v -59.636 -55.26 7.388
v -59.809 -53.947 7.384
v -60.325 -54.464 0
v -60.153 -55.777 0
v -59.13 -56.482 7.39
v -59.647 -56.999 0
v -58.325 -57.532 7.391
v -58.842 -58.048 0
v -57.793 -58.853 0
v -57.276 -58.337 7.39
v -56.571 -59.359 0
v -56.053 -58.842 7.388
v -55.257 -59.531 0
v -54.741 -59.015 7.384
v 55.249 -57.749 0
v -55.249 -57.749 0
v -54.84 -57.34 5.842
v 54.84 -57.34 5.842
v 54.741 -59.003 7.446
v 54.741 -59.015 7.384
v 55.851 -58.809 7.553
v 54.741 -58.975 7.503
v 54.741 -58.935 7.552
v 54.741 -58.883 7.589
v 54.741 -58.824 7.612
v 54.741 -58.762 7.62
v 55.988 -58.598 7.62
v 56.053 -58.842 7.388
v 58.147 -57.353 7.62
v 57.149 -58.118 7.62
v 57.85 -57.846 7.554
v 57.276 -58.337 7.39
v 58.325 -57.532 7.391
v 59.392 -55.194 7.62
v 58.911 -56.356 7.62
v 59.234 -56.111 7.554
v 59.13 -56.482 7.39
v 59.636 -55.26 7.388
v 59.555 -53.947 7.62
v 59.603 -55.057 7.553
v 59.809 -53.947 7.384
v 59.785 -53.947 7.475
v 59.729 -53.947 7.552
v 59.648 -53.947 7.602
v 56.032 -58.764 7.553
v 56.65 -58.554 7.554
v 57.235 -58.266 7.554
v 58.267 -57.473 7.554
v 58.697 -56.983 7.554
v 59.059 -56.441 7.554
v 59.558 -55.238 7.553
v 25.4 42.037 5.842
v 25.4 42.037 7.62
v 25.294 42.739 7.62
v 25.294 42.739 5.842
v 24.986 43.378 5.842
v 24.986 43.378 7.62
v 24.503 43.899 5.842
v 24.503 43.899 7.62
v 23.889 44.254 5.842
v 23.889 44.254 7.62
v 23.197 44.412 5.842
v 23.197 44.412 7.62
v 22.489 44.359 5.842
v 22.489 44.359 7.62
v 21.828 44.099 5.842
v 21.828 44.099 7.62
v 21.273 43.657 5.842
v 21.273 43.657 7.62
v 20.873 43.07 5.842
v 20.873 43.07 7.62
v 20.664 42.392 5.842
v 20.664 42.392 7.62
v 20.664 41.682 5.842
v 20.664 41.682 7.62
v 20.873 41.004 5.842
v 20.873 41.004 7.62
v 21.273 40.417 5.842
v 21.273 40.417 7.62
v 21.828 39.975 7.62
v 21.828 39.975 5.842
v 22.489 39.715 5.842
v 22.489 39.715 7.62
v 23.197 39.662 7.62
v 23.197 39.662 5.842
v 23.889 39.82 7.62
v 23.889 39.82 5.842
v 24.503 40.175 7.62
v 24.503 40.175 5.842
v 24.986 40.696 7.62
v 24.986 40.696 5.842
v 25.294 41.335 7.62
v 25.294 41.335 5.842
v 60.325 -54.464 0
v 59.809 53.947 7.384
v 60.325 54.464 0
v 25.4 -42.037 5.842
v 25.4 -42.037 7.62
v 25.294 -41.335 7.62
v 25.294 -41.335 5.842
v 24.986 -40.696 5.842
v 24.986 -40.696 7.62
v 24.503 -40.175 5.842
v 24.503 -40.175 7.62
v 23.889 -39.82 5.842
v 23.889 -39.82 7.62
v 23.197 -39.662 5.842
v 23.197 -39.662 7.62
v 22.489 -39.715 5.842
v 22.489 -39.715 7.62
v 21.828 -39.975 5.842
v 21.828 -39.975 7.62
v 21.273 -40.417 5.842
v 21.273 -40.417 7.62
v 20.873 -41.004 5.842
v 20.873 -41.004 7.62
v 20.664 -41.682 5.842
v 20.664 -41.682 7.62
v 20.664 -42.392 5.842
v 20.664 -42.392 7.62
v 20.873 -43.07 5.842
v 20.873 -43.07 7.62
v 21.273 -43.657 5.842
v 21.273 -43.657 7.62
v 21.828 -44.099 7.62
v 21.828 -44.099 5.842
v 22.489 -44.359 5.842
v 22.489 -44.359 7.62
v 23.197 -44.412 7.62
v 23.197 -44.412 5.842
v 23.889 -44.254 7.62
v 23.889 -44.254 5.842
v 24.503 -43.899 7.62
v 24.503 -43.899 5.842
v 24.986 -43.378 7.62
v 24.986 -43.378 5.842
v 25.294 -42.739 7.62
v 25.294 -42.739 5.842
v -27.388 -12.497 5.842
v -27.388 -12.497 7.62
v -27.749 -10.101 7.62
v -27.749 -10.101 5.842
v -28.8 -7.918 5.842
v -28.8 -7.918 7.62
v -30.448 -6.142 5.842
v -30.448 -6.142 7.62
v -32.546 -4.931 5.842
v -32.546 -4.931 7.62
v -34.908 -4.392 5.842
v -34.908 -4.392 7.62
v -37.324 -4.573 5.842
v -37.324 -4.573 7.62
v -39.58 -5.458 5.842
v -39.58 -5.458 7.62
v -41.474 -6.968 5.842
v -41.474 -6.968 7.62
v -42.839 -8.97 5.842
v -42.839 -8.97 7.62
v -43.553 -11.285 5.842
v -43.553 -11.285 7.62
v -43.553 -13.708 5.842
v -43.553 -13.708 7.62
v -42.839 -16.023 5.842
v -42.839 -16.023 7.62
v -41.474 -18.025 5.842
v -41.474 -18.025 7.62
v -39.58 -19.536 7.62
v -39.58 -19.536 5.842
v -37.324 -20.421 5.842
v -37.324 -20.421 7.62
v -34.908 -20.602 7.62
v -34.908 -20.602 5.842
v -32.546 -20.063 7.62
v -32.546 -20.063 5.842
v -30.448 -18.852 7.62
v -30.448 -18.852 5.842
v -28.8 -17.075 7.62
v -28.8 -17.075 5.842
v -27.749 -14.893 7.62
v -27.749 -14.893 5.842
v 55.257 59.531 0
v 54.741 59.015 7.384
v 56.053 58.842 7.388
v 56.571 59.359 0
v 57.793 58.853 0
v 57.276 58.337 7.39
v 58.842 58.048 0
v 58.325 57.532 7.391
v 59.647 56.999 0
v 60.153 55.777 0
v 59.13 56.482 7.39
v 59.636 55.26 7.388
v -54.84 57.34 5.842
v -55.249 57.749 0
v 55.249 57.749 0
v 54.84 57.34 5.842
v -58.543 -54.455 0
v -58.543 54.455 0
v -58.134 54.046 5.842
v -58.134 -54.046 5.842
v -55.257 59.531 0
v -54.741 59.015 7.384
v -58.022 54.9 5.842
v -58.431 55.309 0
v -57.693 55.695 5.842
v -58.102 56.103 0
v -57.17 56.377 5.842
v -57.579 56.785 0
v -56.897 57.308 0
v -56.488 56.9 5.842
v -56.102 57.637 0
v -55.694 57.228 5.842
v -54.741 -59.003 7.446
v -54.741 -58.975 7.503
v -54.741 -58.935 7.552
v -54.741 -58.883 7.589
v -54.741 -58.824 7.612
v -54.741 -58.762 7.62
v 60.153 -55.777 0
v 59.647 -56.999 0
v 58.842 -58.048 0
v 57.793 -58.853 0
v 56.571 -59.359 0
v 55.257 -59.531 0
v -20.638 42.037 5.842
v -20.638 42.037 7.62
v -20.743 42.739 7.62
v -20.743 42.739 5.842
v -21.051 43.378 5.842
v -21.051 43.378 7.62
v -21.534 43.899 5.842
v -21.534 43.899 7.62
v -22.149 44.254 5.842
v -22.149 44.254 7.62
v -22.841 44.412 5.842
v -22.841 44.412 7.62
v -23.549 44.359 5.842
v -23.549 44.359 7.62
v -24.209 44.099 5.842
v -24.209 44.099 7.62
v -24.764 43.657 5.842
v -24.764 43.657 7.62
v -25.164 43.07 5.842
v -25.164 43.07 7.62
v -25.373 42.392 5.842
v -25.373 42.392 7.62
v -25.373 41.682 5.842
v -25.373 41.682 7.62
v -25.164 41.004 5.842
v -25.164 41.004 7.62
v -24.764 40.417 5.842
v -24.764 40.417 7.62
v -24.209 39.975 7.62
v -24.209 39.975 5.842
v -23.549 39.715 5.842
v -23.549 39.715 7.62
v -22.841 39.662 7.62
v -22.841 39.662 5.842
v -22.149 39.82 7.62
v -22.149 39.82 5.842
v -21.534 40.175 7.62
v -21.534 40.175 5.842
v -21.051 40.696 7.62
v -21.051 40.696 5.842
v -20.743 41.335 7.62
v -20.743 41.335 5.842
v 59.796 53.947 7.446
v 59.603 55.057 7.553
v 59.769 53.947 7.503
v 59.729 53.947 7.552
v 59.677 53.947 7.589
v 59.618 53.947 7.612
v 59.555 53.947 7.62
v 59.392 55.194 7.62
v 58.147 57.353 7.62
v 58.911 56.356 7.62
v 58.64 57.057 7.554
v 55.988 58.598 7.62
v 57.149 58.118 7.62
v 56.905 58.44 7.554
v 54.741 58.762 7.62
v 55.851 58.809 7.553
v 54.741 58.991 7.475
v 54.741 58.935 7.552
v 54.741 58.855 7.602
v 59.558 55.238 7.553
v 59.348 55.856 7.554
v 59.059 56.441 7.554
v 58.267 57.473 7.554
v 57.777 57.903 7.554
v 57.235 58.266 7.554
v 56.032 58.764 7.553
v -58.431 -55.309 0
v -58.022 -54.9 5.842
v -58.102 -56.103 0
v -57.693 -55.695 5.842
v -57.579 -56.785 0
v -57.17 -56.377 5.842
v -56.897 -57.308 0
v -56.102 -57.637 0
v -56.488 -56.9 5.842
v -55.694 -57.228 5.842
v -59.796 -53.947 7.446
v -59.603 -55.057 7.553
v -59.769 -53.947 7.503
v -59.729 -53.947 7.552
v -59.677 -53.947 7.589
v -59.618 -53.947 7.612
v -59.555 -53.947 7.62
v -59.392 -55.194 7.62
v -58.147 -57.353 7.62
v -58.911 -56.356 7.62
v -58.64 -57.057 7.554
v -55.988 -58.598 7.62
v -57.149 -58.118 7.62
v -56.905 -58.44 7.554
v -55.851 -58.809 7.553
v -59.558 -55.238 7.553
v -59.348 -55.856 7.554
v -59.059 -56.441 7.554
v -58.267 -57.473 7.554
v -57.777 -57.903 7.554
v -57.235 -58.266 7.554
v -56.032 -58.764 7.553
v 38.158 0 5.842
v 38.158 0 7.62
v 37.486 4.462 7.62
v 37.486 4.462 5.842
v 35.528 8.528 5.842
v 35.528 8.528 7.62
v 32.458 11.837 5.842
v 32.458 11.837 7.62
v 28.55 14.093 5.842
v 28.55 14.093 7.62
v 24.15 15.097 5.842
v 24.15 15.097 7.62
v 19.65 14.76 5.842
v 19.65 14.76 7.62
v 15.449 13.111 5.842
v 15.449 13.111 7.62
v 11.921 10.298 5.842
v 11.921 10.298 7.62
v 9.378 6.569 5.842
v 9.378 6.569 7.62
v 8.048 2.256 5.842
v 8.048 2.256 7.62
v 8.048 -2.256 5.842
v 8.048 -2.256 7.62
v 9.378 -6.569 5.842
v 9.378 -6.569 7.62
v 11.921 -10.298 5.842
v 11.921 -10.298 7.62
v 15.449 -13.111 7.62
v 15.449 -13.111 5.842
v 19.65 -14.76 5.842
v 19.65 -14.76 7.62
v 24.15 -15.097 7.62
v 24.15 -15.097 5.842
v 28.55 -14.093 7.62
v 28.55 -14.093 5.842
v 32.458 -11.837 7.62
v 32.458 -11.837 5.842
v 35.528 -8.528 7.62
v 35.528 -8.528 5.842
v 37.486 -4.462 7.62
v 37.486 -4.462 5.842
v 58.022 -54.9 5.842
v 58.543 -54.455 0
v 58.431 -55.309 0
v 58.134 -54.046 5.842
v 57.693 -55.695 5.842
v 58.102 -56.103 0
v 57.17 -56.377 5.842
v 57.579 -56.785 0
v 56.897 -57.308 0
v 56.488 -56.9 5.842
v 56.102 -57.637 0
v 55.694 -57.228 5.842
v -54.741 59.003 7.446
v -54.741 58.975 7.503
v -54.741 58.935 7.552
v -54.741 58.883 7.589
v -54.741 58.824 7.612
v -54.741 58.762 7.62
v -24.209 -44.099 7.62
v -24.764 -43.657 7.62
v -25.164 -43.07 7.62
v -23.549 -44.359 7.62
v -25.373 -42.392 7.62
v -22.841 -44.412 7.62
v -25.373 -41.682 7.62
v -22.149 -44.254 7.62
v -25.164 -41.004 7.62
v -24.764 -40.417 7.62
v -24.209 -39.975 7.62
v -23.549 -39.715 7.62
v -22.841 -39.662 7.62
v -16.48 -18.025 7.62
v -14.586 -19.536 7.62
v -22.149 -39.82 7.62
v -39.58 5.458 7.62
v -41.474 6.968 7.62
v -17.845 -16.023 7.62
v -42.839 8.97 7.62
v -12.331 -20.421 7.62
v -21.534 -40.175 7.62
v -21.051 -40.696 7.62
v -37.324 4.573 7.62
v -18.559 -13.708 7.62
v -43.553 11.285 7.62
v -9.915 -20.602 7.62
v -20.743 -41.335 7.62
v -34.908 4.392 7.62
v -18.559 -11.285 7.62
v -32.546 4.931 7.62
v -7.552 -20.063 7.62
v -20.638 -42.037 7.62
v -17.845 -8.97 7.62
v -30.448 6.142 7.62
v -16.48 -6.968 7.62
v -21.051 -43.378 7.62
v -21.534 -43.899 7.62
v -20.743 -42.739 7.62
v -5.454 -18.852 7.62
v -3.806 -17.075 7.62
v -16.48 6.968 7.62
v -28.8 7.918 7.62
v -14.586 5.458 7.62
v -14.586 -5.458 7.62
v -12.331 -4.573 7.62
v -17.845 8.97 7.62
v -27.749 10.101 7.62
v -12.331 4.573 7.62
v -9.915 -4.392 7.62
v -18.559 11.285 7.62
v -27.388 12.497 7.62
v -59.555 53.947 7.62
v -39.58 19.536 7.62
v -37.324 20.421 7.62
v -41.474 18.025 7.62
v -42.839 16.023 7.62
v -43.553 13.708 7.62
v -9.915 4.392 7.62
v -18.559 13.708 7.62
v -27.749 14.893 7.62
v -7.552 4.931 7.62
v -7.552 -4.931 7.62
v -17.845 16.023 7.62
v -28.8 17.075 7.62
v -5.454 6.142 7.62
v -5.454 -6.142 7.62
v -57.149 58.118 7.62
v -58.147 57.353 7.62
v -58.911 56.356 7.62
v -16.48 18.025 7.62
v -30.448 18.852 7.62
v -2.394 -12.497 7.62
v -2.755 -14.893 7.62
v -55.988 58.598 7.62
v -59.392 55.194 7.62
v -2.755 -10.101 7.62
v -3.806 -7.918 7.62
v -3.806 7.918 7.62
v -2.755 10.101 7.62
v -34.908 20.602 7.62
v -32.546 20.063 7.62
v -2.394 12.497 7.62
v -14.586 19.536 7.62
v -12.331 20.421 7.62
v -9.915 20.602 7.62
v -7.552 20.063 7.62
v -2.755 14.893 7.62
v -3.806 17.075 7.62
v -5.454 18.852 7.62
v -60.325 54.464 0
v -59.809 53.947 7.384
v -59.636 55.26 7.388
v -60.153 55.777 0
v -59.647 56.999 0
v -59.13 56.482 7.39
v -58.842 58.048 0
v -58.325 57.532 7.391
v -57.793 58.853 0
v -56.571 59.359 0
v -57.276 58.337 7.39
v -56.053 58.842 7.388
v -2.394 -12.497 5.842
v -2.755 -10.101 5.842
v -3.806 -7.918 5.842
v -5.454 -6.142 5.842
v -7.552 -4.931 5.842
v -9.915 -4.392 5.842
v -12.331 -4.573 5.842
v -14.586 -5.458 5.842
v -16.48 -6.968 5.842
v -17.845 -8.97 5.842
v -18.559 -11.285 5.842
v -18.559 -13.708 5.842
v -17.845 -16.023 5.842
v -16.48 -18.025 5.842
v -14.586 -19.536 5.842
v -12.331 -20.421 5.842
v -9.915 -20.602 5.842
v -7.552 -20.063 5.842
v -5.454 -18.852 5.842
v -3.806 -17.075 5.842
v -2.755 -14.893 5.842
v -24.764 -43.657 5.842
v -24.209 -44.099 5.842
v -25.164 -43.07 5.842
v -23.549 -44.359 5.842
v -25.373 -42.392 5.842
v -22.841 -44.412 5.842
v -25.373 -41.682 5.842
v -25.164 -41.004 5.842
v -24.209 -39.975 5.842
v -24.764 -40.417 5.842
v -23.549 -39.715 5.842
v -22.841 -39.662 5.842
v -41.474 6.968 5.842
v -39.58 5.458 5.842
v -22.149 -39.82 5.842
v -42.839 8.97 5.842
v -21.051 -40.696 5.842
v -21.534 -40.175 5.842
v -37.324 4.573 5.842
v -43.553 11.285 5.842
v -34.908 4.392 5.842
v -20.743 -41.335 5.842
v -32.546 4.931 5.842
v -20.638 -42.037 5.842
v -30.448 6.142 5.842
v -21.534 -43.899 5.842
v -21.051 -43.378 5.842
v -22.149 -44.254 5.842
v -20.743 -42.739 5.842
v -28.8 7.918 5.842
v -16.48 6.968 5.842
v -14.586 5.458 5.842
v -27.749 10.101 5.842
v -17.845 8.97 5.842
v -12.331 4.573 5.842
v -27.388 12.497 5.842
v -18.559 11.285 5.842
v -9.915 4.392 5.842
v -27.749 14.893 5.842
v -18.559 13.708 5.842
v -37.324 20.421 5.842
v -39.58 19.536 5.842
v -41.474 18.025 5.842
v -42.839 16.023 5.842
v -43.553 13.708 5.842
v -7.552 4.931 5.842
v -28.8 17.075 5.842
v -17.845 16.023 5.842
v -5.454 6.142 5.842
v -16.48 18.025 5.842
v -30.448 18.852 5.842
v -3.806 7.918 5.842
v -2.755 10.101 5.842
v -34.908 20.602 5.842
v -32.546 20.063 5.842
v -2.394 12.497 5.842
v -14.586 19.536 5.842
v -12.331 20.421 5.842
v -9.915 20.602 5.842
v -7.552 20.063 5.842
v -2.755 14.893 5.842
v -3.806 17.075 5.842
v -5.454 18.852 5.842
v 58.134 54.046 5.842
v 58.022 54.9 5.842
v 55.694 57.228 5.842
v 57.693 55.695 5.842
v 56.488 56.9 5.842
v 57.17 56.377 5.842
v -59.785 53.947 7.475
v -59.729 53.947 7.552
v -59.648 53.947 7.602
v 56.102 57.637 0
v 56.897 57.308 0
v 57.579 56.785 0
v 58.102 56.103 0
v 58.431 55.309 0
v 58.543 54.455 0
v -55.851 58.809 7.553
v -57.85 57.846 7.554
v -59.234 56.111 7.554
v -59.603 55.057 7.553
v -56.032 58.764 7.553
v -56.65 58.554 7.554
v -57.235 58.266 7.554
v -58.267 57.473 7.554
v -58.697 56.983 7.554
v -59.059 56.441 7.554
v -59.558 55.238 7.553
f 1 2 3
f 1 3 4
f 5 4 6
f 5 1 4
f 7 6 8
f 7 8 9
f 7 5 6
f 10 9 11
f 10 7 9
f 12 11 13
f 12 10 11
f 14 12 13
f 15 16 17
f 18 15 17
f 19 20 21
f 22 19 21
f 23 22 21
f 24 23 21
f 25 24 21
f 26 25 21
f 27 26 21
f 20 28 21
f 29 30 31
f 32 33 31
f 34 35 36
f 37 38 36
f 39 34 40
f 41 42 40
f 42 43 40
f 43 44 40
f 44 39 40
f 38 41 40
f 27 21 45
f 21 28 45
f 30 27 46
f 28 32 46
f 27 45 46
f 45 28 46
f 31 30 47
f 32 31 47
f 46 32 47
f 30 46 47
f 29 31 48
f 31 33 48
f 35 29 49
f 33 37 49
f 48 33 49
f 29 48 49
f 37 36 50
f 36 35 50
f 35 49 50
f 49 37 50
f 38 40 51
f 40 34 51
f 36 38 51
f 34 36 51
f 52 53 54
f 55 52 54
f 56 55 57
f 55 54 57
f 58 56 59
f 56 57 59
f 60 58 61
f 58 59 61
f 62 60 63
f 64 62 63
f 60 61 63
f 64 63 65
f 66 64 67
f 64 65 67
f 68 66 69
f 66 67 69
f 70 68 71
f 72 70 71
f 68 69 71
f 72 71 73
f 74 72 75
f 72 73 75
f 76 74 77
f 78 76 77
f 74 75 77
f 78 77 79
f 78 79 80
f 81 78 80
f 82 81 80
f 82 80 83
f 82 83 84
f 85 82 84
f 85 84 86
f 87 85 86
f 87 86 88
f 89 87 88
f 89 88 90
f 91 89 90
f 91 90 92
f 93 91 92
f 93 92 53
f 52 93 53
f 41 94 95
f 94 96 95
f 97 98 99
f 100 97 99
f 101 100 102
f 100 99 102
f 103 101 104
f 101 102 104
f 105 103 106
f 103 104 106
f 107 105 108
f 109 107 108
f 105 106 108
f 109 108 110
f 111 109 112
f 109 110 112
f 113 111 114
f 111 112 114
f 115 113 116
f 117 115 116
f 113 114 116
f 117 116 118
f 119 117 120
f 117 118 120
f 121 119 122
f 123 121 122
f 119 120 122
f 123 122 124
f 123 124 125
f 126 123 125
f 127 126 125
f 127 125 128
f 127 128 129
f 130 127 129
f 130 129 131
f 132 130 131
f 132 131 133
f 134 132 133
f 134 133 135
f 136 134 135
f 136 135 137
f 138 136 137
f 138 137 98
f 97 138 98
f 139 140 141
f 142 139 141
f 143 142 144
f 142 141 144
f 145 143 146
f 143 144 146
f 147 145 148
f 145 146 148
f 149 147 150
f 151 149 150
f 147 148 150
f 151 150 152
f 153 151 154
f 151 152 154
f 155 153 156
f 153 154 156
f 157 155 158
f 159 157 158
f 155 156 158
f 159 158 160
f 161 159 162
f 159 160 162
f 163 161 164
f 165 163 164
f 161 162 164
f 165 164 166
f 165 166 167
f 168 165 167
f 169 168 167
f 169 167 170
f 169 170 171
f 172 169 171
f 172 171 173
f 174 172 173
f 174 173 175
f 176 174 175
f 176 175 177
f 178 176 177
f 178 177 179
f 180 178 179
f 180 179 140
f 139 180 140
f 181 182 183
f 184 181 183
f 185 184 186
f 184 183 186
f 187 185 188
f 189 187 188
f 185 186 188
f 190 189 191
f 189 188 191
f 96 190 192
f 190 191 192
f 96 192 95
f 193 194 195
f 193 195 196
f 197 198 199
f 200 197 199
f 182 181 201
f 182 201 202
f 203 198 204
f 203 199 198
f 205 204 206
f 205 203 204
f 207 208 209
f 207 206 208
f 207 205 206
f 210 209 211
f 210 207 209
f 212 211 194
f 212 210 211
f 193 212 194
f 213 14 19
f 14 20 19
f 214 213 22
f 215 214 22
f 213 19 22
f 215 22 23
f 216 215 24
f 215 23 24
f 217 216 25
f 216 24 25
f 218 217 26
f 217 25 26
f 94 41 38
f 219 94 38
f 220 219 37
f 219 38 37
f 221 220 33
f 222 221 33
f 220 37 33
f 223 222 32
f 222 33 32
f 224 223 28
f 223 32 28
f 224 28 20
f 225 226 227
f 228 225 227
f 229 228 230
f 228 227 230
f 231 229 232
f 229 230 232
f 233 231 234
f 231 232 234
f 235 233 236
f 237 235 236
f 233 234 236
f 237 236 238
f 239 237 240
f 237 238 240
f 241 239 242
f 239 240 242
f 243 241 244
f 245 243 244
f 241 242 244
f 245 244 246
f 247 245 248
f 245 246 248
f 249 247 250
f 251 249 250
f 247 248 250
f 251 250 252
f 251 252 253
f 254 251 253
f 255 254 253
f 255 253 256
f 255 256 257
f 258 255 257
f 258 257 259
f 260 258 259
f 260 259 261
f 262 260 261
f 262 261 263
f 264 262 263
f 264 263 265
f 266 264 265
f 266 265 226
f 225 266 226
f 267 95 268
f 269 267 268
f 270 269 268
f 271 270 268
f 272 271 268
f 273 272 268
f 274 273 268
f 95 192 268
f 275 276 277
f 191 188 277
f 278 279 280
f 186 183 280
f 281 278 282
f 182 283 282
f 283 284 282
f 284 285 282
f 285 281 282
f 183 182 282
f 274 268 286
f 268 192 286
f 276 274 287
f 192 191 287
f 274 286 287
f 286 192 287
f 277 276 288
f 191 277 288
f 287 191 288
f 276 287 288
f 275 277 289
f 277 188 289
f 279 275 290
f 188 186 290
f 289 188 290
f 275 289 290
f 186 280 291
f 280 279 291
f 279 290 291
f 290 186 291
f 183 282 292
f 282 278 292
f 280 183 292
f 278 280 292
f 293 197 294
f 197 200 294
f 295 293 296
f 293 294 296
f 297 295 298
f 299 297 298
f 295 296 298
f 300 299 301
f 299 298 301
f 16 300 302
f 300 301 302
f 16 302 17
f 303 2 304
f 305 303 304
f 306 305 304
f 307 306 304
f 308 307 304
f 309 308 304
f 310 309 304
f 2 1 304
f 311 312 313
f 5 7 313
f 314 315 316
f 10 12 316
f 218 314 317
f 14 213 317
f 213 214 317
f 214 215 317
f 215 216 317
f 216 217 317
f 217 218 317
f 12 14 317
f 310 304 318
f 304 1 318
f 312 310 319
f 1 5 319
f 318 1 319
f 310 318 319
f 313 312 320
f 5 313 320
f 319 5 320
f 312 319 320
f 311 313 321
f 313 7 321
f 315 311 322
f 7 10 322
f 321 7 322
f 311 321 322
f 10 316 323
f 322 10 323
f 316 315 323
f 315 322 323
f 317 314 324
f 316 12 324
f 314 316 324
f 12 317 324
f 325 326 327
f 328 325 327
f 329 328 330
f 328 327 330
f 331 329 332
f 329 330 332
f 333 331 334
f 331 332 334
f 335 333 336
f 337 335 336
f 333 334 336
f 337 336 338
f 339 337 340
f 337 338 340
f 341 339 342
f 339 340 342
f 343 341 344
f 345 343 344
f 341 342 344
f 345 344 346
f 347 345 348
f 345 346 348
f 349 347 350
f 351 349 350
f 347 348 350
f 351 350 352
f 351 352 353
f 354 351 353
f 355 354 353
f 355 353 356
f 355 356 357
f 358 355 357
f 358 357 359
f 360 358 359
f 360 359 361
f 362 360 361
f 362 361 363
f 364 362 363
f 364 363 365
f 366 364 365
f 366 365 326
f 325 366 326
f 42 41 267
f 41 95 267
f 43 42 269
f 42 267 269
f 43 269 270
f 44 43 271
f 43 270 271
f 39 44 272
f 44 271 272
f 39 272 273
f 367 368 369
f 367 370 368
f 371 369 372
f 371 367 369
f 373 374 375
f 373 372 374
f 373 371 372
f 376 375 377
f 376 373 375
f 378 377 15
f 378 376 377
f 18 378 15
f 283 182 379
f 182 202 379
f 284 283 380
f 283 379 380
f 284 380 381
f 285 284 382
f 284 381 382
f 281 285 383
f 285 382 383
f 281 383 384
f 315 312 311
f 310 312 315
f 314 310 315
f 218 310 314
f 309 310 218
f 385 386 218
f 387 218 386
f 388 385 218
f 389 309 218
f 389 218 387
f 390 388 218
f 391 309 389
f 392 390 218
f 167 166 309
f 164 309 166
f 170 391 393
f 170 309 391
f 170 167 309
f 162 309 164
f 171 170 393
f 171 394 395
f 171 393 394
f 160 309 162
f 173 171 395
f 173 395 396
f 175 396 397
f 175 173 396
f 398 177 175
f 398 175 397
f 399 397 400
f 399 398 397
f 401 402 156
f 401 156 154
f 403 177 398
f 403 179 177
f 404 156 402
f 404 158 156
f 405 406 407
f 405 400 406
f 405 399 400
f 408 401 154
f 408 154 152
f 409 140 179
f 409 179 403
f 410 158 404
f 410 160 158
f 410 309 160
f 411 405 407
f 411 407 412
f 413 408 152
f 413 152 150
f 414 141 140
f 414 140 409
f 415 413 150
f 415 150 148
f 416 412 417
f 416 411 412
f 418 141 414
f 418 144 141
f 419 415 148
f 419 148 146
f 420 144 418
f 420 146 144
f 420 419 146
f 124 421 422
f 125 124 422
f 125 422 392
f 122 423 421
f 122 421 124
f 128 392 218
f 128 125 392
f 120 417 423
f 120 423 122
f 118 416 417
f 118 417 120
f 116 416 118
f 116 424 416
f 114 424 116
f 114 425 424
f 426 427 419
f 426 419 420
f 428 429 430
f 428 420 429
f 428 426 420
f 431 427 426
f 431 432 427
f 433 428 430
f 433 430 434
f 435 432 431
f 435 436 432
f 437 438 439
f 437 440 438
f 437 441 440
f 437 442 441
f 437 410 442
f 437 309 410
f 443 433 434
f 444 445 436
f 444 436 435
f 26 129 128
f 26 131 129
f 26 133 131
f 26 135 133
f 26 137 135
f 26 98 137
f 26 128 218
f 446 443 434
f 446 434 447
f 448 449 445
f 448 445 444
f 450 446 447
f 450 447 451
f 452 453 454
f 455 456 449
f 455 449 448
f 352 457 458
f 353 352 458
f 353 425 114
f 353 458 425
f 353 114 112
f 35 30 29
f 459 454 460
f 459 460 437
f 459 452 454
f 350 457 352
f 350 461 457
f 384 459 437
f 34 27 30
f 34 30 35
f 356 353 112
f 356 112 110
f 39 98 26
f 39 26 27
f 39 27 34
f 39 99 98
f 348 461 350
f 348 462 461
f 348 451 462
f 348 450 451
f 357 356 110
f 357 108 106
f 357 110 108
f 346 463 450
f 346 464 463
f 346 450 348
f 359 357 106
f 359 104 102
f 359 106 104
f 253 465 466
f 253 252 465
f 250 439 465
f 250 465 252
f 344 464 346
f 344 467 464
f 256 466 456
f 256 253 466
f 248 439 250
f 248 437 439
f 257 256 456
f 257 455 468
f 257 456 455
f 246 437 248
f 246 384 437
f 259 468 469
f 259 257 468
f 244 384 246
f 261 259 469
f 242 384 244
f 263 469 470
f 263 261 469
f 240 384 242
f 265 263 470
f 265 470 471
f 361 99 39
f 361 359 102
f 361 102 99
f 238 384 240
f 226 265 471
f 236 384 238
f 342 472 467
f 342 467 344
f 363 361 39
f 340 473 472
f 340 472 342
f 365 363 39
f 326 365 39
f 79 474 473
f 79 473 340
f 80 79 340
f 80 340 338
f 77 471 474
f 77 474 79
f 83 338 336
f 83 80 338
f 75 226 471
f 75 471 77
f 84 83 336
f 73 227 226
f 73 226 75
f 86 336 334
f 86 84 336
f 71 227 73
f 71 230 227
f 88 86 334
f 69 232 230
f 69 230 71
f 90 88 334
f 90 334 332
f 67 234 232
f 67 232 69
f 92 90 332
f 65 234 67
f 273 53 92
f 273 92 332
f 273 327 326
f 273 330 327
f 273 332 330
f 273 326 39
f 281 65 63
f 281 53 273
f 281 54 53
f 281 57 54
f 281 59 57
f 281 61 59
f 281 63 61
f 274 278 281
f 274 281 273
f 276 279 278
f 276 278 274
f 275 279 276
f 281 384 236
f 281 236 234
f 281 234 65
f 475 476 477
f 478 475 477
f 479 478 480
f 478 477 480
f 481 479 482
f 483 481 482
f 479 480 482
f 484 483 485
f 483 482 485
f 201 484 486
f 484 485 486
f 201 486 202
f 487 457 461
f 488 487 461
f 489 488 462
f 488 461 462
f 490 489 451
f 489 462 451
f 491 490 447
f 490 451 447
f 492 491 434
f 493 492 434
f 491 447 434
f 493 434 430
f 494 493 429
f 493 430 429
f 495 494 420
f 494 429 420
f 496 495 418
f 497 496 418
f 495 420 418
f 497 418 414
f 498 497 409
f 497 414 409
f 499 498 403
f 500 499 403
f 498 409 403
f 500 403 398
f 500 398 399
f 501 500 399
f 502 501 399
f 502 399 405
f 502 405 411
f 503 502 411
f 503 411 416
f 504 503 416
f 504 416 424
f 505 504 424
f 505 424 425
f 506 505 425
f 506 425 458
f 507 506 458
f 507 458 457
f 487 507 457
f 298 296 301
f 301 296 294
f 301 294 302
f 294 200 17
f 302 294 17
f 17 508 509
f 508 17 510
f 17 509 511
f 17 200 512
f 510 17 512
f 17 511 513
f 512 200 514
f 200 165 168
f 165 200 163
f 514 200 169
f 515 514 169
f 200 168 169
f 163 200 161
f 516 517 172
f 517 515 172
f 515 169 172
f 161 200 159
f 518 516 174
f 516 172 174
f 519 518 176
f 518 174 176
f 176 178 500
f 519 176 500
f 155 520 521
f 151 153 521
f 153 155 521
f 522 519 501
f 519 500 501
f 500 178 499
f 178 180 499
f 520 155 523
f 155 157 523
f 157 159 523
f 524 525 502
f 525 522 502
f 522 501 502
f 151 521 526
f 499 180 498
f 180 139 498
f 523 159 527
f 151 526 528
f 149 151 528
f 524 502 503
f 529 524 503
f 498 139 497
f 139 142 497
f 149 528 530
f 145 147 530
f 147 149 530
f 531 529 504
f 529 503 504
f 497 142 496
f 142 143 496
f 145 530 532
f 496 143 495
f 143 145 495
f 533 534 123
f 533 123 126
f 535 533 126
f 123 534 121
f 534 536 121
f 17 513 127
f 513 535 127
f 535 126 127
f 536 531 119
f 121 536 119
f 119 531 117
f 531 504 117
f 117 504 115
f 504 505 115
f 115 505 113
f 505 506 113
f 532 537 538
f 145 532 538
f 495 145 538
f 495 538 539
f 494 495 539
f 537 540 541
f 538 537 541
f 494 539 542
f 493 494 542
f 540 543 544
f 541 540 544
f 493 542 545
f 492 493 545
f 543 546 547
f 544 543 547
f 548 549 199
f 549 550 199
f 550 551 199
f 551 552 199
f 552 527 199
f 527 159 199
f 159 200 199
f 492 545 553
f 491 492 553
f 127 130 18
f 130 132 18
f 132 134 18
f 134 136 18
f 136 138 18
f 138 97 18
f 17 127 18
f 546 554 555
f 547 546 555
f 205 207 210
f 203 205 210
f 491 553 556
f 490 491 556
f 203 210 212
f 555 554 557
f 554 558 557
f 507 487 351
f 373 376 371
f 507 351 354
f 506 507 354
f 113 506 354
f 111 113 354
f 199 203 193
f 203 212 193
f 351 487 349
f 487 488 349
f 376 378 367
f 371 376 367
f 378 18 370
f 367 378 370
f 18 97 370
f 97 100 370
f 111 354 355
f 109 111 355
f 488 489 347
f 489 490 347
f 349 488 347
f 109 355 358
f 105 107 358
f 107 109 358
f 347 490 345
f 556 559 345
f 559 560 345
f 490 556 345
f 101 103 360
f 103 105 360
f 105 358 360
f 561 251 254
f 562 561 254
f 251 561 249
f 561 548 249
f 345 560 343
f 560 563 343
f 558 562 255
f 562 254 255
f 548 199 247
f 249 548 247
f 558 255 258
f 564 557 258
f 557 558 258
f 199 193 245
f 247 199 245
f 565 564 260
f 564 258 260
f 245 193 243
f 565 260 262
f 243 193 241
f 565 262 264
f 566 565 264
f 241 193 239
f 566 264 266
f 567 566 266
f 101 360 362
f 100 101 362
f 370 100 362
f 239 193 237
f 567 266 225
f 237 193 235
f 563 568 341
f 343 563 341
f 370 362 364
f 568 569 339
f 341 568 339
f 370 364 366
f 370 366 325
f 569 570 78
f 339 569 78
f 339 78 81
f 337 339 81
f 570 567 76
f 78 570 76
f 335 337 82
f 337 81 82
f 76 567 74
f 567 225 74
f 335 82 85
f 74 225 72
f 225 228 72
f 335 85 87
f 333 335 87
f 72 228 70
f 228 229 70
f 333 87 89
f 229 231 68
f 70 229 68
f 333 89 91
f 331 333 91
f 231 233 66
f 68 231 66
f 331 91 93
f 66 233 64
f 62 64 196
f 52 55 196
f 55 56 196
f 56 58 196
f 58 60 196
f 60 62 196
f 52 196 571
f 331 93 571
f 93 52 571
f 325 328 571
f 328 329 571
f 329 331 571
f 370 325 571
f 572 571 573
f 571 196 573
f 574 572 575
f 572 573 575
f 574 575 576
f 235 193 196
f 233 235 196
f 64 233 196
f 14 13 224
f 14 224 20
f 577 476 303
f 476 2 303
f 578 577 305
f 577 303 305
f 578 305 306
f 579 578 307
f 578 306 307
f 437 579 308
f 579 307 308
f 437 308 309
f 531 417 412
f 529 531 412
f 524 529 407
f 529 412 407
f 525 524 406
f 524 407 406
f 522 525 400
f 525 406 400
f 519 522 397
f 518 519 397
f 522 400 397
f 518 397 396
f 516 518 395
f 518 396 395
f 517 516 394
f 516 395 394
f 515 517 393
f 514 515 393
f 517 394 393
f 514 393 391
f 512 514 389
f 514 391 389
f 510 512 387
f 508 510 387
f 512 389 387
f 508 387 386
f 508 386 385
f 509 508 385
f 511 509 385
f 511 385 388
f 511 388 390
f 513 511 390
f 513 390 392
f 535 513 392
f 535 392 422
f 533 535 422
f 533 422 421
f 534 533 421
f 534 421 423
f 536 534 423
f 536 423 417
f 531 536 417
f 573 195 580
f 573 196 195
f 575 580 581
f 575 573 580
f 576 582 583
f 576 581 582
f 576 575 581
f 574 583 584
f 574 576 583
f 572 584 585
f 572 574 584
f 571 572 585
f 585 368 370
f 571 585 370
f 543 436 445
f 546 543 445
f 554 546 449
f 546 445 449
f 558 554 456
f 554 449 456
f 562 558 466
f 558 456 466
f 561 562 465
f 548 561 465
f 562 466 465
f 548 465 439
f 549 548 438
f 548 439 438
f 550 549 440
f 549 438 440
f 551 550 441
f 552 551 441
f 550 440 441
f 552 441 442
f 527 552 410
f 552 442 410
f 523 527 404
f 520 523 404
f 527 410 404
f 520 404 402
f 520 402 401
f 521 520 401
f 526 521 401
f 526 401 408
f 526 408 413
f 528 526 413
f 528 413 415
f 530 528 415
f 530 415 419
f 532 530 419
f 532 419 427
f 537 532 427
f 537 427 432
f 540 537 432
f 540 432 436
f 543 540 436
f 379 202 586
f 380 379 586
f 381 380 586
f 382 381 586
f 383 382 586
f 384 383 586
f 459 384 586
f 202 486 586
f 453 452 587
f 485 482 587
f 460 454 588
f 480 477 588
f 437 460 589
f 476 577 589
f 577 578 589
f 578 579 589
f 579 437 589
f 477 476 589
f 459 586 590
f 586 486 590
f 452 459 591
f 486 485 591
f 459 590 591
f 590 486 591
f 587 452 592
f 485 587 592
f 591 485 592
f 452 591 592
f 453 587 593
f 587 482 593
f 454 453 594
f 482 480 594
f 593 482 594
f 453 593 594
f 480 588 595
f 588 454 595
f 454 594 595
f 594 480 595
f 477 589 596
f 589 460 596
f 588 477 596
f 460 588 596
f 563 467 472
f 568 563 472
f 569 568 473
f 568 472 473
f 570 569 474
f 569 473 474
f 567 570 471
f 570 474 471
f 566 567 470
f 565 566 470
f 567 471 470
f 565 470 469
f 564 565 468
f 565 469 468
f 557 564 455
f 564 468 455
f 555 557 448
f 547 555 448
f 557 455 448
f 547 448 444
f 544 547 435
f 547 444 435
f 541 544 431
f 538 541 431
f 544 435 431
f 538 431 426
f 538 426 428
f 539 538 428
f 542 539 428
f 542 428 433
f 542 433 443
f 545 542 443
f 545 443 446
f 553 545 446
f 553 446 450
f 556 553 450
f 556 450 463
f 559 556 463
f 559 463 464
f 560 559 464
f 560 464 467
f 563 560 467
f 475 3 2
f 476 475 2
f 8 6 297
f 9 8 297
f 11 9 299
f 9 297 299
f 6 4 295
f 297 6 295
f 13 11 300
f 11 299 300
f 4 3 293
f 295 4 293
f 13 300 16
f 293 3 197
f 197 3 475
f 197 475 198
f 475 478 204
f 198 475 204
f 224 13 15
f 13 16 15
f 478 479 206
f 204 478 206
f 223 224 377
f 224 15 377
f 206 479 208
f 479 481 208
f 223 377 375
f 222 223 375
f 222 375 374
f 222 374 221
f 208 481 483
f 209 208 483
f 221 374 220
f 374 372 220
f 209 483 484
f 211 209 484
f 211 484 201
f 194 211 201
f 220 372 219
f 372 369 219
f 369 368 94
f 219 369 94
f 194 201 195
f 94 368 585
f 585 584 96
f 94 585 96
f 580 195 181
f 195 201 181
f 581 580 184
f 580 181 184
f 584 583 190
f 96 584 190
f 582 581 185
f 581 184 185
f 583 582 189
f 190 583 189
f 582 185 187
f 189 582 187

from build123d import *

# Parameters (mm, degrees)
SKETCH1_W           = 120.65
SKETCH1_H           = 119.0625
BOSS_EXTRUDE1_DEPTH = 7.62
BOSS_EXTRUDE1_TAPER = 4
FILLET1_R           = 5.08
FILLET2_R           = 0.254
SHELL1_T            = -1.778
SKETCH5_R           = 2.38125
CUT_EXTRUDE1_DEPTH  = 8.6200001
SKETCH6_R           = 15.13967
SKETCH6_R_2         = 8.128
CUT_EXTRUDE2_DEPTH  = 8.6200001


with BuildPart() as part:
    # Sketch1 → Boss-Extrude1 (new body)
    with BuildSketch(Plane.XY):
        Rectangle(SKETCH1_W, SKETCH1_H)
    extrude(amount=BOSS_EXTRUDE1_DEPTH, taper=BOSS_EXTRUDE1_TAPER)

    # Fillet1
    fillet1_edges = [part.edges().sort_by_distance(p)[0] for p in [
        (-60.058578385, 59.264828385, 3.810006606),
        (60.058578385, 59.264828385, 3.810006606),
        (60.058578385, -59.264828385, 3.810006606),
        (-60.058578846, -59.264828846, 3.81),
    ]]
    fillet(fillet1_edges, radius=FILLET1_R)

    # Fillet2
    fillet2_edges = [part.edges().sort_by_distance(p)[0] for p in [
        (0, -58.998407693, 7.62),
        (-59.792157693, 0, 7.62),
        (59.792157693, 0, 7.62),
        (0, 58.998407693, 7.62),
        (-58.30937708, 57.51562708, 7.62),
        (58.30937708, 57.51562708, 7.62),
        (58.30937708, -57.51562708, 7.62),
        (-58.30937708, -57.51562708, 7.62),
    ]]
    fillet(fillet2_edges, radius=FILLET2_R)

    # Shell1
    shell1_openings = [part.faces().sort_by_distance(p)[0] for p in [
        (0, 0, 0),
    ]]
    offset(amount=SHELL1_T, openings=shell1_openings, kind=Kind.INTERSECTION)

    # Sketch5 → Cut-Extrude1 (cut, through all)
    with BuildSketch(Plane.XY.offset(7.62)):
        with Locations((-23.01875, 42.037)):
            Circle(SKETCH5_R)
        with Locations((-23.01875, -42.037)):
            Circle(SKETCH5_R)
        with Locations((23.01875, -42.037)):
            Circle(SKETCH5_R)
        with Locations((23.01875, 42.037)):
            Circle(SKETCH5_R)
    extrude(amount=-CUT_EXTRUDE1_DEPTH, mode=Mode.SUBTRACT)

    # Sketch6 → Cut-Extrude2 (cut, through all)
    with BuildSketch(Plane.XY.offset(7.62)):
        with Locations((23.01875, 0)):
            Circle(SKETCH6_R)
        with Locations((-35.51555, 12.4968)):
            Circle(SKETCH6_R_2)
        with Locations((-10.52195, 12.4968)):
            Circle(SKETCH6_R_2)
        with Locations((-10.52195, -12.4968)):
            Circle(SKETCH6_R_2)
        with Locations((-35.51555, -12.4968)):
            Circle(SKETCH6_R_2)
    extrude(amount=-CUT_EXTRUDE2_DEPTH, mode=Mode.SUBTRACT)


solid = part.part
